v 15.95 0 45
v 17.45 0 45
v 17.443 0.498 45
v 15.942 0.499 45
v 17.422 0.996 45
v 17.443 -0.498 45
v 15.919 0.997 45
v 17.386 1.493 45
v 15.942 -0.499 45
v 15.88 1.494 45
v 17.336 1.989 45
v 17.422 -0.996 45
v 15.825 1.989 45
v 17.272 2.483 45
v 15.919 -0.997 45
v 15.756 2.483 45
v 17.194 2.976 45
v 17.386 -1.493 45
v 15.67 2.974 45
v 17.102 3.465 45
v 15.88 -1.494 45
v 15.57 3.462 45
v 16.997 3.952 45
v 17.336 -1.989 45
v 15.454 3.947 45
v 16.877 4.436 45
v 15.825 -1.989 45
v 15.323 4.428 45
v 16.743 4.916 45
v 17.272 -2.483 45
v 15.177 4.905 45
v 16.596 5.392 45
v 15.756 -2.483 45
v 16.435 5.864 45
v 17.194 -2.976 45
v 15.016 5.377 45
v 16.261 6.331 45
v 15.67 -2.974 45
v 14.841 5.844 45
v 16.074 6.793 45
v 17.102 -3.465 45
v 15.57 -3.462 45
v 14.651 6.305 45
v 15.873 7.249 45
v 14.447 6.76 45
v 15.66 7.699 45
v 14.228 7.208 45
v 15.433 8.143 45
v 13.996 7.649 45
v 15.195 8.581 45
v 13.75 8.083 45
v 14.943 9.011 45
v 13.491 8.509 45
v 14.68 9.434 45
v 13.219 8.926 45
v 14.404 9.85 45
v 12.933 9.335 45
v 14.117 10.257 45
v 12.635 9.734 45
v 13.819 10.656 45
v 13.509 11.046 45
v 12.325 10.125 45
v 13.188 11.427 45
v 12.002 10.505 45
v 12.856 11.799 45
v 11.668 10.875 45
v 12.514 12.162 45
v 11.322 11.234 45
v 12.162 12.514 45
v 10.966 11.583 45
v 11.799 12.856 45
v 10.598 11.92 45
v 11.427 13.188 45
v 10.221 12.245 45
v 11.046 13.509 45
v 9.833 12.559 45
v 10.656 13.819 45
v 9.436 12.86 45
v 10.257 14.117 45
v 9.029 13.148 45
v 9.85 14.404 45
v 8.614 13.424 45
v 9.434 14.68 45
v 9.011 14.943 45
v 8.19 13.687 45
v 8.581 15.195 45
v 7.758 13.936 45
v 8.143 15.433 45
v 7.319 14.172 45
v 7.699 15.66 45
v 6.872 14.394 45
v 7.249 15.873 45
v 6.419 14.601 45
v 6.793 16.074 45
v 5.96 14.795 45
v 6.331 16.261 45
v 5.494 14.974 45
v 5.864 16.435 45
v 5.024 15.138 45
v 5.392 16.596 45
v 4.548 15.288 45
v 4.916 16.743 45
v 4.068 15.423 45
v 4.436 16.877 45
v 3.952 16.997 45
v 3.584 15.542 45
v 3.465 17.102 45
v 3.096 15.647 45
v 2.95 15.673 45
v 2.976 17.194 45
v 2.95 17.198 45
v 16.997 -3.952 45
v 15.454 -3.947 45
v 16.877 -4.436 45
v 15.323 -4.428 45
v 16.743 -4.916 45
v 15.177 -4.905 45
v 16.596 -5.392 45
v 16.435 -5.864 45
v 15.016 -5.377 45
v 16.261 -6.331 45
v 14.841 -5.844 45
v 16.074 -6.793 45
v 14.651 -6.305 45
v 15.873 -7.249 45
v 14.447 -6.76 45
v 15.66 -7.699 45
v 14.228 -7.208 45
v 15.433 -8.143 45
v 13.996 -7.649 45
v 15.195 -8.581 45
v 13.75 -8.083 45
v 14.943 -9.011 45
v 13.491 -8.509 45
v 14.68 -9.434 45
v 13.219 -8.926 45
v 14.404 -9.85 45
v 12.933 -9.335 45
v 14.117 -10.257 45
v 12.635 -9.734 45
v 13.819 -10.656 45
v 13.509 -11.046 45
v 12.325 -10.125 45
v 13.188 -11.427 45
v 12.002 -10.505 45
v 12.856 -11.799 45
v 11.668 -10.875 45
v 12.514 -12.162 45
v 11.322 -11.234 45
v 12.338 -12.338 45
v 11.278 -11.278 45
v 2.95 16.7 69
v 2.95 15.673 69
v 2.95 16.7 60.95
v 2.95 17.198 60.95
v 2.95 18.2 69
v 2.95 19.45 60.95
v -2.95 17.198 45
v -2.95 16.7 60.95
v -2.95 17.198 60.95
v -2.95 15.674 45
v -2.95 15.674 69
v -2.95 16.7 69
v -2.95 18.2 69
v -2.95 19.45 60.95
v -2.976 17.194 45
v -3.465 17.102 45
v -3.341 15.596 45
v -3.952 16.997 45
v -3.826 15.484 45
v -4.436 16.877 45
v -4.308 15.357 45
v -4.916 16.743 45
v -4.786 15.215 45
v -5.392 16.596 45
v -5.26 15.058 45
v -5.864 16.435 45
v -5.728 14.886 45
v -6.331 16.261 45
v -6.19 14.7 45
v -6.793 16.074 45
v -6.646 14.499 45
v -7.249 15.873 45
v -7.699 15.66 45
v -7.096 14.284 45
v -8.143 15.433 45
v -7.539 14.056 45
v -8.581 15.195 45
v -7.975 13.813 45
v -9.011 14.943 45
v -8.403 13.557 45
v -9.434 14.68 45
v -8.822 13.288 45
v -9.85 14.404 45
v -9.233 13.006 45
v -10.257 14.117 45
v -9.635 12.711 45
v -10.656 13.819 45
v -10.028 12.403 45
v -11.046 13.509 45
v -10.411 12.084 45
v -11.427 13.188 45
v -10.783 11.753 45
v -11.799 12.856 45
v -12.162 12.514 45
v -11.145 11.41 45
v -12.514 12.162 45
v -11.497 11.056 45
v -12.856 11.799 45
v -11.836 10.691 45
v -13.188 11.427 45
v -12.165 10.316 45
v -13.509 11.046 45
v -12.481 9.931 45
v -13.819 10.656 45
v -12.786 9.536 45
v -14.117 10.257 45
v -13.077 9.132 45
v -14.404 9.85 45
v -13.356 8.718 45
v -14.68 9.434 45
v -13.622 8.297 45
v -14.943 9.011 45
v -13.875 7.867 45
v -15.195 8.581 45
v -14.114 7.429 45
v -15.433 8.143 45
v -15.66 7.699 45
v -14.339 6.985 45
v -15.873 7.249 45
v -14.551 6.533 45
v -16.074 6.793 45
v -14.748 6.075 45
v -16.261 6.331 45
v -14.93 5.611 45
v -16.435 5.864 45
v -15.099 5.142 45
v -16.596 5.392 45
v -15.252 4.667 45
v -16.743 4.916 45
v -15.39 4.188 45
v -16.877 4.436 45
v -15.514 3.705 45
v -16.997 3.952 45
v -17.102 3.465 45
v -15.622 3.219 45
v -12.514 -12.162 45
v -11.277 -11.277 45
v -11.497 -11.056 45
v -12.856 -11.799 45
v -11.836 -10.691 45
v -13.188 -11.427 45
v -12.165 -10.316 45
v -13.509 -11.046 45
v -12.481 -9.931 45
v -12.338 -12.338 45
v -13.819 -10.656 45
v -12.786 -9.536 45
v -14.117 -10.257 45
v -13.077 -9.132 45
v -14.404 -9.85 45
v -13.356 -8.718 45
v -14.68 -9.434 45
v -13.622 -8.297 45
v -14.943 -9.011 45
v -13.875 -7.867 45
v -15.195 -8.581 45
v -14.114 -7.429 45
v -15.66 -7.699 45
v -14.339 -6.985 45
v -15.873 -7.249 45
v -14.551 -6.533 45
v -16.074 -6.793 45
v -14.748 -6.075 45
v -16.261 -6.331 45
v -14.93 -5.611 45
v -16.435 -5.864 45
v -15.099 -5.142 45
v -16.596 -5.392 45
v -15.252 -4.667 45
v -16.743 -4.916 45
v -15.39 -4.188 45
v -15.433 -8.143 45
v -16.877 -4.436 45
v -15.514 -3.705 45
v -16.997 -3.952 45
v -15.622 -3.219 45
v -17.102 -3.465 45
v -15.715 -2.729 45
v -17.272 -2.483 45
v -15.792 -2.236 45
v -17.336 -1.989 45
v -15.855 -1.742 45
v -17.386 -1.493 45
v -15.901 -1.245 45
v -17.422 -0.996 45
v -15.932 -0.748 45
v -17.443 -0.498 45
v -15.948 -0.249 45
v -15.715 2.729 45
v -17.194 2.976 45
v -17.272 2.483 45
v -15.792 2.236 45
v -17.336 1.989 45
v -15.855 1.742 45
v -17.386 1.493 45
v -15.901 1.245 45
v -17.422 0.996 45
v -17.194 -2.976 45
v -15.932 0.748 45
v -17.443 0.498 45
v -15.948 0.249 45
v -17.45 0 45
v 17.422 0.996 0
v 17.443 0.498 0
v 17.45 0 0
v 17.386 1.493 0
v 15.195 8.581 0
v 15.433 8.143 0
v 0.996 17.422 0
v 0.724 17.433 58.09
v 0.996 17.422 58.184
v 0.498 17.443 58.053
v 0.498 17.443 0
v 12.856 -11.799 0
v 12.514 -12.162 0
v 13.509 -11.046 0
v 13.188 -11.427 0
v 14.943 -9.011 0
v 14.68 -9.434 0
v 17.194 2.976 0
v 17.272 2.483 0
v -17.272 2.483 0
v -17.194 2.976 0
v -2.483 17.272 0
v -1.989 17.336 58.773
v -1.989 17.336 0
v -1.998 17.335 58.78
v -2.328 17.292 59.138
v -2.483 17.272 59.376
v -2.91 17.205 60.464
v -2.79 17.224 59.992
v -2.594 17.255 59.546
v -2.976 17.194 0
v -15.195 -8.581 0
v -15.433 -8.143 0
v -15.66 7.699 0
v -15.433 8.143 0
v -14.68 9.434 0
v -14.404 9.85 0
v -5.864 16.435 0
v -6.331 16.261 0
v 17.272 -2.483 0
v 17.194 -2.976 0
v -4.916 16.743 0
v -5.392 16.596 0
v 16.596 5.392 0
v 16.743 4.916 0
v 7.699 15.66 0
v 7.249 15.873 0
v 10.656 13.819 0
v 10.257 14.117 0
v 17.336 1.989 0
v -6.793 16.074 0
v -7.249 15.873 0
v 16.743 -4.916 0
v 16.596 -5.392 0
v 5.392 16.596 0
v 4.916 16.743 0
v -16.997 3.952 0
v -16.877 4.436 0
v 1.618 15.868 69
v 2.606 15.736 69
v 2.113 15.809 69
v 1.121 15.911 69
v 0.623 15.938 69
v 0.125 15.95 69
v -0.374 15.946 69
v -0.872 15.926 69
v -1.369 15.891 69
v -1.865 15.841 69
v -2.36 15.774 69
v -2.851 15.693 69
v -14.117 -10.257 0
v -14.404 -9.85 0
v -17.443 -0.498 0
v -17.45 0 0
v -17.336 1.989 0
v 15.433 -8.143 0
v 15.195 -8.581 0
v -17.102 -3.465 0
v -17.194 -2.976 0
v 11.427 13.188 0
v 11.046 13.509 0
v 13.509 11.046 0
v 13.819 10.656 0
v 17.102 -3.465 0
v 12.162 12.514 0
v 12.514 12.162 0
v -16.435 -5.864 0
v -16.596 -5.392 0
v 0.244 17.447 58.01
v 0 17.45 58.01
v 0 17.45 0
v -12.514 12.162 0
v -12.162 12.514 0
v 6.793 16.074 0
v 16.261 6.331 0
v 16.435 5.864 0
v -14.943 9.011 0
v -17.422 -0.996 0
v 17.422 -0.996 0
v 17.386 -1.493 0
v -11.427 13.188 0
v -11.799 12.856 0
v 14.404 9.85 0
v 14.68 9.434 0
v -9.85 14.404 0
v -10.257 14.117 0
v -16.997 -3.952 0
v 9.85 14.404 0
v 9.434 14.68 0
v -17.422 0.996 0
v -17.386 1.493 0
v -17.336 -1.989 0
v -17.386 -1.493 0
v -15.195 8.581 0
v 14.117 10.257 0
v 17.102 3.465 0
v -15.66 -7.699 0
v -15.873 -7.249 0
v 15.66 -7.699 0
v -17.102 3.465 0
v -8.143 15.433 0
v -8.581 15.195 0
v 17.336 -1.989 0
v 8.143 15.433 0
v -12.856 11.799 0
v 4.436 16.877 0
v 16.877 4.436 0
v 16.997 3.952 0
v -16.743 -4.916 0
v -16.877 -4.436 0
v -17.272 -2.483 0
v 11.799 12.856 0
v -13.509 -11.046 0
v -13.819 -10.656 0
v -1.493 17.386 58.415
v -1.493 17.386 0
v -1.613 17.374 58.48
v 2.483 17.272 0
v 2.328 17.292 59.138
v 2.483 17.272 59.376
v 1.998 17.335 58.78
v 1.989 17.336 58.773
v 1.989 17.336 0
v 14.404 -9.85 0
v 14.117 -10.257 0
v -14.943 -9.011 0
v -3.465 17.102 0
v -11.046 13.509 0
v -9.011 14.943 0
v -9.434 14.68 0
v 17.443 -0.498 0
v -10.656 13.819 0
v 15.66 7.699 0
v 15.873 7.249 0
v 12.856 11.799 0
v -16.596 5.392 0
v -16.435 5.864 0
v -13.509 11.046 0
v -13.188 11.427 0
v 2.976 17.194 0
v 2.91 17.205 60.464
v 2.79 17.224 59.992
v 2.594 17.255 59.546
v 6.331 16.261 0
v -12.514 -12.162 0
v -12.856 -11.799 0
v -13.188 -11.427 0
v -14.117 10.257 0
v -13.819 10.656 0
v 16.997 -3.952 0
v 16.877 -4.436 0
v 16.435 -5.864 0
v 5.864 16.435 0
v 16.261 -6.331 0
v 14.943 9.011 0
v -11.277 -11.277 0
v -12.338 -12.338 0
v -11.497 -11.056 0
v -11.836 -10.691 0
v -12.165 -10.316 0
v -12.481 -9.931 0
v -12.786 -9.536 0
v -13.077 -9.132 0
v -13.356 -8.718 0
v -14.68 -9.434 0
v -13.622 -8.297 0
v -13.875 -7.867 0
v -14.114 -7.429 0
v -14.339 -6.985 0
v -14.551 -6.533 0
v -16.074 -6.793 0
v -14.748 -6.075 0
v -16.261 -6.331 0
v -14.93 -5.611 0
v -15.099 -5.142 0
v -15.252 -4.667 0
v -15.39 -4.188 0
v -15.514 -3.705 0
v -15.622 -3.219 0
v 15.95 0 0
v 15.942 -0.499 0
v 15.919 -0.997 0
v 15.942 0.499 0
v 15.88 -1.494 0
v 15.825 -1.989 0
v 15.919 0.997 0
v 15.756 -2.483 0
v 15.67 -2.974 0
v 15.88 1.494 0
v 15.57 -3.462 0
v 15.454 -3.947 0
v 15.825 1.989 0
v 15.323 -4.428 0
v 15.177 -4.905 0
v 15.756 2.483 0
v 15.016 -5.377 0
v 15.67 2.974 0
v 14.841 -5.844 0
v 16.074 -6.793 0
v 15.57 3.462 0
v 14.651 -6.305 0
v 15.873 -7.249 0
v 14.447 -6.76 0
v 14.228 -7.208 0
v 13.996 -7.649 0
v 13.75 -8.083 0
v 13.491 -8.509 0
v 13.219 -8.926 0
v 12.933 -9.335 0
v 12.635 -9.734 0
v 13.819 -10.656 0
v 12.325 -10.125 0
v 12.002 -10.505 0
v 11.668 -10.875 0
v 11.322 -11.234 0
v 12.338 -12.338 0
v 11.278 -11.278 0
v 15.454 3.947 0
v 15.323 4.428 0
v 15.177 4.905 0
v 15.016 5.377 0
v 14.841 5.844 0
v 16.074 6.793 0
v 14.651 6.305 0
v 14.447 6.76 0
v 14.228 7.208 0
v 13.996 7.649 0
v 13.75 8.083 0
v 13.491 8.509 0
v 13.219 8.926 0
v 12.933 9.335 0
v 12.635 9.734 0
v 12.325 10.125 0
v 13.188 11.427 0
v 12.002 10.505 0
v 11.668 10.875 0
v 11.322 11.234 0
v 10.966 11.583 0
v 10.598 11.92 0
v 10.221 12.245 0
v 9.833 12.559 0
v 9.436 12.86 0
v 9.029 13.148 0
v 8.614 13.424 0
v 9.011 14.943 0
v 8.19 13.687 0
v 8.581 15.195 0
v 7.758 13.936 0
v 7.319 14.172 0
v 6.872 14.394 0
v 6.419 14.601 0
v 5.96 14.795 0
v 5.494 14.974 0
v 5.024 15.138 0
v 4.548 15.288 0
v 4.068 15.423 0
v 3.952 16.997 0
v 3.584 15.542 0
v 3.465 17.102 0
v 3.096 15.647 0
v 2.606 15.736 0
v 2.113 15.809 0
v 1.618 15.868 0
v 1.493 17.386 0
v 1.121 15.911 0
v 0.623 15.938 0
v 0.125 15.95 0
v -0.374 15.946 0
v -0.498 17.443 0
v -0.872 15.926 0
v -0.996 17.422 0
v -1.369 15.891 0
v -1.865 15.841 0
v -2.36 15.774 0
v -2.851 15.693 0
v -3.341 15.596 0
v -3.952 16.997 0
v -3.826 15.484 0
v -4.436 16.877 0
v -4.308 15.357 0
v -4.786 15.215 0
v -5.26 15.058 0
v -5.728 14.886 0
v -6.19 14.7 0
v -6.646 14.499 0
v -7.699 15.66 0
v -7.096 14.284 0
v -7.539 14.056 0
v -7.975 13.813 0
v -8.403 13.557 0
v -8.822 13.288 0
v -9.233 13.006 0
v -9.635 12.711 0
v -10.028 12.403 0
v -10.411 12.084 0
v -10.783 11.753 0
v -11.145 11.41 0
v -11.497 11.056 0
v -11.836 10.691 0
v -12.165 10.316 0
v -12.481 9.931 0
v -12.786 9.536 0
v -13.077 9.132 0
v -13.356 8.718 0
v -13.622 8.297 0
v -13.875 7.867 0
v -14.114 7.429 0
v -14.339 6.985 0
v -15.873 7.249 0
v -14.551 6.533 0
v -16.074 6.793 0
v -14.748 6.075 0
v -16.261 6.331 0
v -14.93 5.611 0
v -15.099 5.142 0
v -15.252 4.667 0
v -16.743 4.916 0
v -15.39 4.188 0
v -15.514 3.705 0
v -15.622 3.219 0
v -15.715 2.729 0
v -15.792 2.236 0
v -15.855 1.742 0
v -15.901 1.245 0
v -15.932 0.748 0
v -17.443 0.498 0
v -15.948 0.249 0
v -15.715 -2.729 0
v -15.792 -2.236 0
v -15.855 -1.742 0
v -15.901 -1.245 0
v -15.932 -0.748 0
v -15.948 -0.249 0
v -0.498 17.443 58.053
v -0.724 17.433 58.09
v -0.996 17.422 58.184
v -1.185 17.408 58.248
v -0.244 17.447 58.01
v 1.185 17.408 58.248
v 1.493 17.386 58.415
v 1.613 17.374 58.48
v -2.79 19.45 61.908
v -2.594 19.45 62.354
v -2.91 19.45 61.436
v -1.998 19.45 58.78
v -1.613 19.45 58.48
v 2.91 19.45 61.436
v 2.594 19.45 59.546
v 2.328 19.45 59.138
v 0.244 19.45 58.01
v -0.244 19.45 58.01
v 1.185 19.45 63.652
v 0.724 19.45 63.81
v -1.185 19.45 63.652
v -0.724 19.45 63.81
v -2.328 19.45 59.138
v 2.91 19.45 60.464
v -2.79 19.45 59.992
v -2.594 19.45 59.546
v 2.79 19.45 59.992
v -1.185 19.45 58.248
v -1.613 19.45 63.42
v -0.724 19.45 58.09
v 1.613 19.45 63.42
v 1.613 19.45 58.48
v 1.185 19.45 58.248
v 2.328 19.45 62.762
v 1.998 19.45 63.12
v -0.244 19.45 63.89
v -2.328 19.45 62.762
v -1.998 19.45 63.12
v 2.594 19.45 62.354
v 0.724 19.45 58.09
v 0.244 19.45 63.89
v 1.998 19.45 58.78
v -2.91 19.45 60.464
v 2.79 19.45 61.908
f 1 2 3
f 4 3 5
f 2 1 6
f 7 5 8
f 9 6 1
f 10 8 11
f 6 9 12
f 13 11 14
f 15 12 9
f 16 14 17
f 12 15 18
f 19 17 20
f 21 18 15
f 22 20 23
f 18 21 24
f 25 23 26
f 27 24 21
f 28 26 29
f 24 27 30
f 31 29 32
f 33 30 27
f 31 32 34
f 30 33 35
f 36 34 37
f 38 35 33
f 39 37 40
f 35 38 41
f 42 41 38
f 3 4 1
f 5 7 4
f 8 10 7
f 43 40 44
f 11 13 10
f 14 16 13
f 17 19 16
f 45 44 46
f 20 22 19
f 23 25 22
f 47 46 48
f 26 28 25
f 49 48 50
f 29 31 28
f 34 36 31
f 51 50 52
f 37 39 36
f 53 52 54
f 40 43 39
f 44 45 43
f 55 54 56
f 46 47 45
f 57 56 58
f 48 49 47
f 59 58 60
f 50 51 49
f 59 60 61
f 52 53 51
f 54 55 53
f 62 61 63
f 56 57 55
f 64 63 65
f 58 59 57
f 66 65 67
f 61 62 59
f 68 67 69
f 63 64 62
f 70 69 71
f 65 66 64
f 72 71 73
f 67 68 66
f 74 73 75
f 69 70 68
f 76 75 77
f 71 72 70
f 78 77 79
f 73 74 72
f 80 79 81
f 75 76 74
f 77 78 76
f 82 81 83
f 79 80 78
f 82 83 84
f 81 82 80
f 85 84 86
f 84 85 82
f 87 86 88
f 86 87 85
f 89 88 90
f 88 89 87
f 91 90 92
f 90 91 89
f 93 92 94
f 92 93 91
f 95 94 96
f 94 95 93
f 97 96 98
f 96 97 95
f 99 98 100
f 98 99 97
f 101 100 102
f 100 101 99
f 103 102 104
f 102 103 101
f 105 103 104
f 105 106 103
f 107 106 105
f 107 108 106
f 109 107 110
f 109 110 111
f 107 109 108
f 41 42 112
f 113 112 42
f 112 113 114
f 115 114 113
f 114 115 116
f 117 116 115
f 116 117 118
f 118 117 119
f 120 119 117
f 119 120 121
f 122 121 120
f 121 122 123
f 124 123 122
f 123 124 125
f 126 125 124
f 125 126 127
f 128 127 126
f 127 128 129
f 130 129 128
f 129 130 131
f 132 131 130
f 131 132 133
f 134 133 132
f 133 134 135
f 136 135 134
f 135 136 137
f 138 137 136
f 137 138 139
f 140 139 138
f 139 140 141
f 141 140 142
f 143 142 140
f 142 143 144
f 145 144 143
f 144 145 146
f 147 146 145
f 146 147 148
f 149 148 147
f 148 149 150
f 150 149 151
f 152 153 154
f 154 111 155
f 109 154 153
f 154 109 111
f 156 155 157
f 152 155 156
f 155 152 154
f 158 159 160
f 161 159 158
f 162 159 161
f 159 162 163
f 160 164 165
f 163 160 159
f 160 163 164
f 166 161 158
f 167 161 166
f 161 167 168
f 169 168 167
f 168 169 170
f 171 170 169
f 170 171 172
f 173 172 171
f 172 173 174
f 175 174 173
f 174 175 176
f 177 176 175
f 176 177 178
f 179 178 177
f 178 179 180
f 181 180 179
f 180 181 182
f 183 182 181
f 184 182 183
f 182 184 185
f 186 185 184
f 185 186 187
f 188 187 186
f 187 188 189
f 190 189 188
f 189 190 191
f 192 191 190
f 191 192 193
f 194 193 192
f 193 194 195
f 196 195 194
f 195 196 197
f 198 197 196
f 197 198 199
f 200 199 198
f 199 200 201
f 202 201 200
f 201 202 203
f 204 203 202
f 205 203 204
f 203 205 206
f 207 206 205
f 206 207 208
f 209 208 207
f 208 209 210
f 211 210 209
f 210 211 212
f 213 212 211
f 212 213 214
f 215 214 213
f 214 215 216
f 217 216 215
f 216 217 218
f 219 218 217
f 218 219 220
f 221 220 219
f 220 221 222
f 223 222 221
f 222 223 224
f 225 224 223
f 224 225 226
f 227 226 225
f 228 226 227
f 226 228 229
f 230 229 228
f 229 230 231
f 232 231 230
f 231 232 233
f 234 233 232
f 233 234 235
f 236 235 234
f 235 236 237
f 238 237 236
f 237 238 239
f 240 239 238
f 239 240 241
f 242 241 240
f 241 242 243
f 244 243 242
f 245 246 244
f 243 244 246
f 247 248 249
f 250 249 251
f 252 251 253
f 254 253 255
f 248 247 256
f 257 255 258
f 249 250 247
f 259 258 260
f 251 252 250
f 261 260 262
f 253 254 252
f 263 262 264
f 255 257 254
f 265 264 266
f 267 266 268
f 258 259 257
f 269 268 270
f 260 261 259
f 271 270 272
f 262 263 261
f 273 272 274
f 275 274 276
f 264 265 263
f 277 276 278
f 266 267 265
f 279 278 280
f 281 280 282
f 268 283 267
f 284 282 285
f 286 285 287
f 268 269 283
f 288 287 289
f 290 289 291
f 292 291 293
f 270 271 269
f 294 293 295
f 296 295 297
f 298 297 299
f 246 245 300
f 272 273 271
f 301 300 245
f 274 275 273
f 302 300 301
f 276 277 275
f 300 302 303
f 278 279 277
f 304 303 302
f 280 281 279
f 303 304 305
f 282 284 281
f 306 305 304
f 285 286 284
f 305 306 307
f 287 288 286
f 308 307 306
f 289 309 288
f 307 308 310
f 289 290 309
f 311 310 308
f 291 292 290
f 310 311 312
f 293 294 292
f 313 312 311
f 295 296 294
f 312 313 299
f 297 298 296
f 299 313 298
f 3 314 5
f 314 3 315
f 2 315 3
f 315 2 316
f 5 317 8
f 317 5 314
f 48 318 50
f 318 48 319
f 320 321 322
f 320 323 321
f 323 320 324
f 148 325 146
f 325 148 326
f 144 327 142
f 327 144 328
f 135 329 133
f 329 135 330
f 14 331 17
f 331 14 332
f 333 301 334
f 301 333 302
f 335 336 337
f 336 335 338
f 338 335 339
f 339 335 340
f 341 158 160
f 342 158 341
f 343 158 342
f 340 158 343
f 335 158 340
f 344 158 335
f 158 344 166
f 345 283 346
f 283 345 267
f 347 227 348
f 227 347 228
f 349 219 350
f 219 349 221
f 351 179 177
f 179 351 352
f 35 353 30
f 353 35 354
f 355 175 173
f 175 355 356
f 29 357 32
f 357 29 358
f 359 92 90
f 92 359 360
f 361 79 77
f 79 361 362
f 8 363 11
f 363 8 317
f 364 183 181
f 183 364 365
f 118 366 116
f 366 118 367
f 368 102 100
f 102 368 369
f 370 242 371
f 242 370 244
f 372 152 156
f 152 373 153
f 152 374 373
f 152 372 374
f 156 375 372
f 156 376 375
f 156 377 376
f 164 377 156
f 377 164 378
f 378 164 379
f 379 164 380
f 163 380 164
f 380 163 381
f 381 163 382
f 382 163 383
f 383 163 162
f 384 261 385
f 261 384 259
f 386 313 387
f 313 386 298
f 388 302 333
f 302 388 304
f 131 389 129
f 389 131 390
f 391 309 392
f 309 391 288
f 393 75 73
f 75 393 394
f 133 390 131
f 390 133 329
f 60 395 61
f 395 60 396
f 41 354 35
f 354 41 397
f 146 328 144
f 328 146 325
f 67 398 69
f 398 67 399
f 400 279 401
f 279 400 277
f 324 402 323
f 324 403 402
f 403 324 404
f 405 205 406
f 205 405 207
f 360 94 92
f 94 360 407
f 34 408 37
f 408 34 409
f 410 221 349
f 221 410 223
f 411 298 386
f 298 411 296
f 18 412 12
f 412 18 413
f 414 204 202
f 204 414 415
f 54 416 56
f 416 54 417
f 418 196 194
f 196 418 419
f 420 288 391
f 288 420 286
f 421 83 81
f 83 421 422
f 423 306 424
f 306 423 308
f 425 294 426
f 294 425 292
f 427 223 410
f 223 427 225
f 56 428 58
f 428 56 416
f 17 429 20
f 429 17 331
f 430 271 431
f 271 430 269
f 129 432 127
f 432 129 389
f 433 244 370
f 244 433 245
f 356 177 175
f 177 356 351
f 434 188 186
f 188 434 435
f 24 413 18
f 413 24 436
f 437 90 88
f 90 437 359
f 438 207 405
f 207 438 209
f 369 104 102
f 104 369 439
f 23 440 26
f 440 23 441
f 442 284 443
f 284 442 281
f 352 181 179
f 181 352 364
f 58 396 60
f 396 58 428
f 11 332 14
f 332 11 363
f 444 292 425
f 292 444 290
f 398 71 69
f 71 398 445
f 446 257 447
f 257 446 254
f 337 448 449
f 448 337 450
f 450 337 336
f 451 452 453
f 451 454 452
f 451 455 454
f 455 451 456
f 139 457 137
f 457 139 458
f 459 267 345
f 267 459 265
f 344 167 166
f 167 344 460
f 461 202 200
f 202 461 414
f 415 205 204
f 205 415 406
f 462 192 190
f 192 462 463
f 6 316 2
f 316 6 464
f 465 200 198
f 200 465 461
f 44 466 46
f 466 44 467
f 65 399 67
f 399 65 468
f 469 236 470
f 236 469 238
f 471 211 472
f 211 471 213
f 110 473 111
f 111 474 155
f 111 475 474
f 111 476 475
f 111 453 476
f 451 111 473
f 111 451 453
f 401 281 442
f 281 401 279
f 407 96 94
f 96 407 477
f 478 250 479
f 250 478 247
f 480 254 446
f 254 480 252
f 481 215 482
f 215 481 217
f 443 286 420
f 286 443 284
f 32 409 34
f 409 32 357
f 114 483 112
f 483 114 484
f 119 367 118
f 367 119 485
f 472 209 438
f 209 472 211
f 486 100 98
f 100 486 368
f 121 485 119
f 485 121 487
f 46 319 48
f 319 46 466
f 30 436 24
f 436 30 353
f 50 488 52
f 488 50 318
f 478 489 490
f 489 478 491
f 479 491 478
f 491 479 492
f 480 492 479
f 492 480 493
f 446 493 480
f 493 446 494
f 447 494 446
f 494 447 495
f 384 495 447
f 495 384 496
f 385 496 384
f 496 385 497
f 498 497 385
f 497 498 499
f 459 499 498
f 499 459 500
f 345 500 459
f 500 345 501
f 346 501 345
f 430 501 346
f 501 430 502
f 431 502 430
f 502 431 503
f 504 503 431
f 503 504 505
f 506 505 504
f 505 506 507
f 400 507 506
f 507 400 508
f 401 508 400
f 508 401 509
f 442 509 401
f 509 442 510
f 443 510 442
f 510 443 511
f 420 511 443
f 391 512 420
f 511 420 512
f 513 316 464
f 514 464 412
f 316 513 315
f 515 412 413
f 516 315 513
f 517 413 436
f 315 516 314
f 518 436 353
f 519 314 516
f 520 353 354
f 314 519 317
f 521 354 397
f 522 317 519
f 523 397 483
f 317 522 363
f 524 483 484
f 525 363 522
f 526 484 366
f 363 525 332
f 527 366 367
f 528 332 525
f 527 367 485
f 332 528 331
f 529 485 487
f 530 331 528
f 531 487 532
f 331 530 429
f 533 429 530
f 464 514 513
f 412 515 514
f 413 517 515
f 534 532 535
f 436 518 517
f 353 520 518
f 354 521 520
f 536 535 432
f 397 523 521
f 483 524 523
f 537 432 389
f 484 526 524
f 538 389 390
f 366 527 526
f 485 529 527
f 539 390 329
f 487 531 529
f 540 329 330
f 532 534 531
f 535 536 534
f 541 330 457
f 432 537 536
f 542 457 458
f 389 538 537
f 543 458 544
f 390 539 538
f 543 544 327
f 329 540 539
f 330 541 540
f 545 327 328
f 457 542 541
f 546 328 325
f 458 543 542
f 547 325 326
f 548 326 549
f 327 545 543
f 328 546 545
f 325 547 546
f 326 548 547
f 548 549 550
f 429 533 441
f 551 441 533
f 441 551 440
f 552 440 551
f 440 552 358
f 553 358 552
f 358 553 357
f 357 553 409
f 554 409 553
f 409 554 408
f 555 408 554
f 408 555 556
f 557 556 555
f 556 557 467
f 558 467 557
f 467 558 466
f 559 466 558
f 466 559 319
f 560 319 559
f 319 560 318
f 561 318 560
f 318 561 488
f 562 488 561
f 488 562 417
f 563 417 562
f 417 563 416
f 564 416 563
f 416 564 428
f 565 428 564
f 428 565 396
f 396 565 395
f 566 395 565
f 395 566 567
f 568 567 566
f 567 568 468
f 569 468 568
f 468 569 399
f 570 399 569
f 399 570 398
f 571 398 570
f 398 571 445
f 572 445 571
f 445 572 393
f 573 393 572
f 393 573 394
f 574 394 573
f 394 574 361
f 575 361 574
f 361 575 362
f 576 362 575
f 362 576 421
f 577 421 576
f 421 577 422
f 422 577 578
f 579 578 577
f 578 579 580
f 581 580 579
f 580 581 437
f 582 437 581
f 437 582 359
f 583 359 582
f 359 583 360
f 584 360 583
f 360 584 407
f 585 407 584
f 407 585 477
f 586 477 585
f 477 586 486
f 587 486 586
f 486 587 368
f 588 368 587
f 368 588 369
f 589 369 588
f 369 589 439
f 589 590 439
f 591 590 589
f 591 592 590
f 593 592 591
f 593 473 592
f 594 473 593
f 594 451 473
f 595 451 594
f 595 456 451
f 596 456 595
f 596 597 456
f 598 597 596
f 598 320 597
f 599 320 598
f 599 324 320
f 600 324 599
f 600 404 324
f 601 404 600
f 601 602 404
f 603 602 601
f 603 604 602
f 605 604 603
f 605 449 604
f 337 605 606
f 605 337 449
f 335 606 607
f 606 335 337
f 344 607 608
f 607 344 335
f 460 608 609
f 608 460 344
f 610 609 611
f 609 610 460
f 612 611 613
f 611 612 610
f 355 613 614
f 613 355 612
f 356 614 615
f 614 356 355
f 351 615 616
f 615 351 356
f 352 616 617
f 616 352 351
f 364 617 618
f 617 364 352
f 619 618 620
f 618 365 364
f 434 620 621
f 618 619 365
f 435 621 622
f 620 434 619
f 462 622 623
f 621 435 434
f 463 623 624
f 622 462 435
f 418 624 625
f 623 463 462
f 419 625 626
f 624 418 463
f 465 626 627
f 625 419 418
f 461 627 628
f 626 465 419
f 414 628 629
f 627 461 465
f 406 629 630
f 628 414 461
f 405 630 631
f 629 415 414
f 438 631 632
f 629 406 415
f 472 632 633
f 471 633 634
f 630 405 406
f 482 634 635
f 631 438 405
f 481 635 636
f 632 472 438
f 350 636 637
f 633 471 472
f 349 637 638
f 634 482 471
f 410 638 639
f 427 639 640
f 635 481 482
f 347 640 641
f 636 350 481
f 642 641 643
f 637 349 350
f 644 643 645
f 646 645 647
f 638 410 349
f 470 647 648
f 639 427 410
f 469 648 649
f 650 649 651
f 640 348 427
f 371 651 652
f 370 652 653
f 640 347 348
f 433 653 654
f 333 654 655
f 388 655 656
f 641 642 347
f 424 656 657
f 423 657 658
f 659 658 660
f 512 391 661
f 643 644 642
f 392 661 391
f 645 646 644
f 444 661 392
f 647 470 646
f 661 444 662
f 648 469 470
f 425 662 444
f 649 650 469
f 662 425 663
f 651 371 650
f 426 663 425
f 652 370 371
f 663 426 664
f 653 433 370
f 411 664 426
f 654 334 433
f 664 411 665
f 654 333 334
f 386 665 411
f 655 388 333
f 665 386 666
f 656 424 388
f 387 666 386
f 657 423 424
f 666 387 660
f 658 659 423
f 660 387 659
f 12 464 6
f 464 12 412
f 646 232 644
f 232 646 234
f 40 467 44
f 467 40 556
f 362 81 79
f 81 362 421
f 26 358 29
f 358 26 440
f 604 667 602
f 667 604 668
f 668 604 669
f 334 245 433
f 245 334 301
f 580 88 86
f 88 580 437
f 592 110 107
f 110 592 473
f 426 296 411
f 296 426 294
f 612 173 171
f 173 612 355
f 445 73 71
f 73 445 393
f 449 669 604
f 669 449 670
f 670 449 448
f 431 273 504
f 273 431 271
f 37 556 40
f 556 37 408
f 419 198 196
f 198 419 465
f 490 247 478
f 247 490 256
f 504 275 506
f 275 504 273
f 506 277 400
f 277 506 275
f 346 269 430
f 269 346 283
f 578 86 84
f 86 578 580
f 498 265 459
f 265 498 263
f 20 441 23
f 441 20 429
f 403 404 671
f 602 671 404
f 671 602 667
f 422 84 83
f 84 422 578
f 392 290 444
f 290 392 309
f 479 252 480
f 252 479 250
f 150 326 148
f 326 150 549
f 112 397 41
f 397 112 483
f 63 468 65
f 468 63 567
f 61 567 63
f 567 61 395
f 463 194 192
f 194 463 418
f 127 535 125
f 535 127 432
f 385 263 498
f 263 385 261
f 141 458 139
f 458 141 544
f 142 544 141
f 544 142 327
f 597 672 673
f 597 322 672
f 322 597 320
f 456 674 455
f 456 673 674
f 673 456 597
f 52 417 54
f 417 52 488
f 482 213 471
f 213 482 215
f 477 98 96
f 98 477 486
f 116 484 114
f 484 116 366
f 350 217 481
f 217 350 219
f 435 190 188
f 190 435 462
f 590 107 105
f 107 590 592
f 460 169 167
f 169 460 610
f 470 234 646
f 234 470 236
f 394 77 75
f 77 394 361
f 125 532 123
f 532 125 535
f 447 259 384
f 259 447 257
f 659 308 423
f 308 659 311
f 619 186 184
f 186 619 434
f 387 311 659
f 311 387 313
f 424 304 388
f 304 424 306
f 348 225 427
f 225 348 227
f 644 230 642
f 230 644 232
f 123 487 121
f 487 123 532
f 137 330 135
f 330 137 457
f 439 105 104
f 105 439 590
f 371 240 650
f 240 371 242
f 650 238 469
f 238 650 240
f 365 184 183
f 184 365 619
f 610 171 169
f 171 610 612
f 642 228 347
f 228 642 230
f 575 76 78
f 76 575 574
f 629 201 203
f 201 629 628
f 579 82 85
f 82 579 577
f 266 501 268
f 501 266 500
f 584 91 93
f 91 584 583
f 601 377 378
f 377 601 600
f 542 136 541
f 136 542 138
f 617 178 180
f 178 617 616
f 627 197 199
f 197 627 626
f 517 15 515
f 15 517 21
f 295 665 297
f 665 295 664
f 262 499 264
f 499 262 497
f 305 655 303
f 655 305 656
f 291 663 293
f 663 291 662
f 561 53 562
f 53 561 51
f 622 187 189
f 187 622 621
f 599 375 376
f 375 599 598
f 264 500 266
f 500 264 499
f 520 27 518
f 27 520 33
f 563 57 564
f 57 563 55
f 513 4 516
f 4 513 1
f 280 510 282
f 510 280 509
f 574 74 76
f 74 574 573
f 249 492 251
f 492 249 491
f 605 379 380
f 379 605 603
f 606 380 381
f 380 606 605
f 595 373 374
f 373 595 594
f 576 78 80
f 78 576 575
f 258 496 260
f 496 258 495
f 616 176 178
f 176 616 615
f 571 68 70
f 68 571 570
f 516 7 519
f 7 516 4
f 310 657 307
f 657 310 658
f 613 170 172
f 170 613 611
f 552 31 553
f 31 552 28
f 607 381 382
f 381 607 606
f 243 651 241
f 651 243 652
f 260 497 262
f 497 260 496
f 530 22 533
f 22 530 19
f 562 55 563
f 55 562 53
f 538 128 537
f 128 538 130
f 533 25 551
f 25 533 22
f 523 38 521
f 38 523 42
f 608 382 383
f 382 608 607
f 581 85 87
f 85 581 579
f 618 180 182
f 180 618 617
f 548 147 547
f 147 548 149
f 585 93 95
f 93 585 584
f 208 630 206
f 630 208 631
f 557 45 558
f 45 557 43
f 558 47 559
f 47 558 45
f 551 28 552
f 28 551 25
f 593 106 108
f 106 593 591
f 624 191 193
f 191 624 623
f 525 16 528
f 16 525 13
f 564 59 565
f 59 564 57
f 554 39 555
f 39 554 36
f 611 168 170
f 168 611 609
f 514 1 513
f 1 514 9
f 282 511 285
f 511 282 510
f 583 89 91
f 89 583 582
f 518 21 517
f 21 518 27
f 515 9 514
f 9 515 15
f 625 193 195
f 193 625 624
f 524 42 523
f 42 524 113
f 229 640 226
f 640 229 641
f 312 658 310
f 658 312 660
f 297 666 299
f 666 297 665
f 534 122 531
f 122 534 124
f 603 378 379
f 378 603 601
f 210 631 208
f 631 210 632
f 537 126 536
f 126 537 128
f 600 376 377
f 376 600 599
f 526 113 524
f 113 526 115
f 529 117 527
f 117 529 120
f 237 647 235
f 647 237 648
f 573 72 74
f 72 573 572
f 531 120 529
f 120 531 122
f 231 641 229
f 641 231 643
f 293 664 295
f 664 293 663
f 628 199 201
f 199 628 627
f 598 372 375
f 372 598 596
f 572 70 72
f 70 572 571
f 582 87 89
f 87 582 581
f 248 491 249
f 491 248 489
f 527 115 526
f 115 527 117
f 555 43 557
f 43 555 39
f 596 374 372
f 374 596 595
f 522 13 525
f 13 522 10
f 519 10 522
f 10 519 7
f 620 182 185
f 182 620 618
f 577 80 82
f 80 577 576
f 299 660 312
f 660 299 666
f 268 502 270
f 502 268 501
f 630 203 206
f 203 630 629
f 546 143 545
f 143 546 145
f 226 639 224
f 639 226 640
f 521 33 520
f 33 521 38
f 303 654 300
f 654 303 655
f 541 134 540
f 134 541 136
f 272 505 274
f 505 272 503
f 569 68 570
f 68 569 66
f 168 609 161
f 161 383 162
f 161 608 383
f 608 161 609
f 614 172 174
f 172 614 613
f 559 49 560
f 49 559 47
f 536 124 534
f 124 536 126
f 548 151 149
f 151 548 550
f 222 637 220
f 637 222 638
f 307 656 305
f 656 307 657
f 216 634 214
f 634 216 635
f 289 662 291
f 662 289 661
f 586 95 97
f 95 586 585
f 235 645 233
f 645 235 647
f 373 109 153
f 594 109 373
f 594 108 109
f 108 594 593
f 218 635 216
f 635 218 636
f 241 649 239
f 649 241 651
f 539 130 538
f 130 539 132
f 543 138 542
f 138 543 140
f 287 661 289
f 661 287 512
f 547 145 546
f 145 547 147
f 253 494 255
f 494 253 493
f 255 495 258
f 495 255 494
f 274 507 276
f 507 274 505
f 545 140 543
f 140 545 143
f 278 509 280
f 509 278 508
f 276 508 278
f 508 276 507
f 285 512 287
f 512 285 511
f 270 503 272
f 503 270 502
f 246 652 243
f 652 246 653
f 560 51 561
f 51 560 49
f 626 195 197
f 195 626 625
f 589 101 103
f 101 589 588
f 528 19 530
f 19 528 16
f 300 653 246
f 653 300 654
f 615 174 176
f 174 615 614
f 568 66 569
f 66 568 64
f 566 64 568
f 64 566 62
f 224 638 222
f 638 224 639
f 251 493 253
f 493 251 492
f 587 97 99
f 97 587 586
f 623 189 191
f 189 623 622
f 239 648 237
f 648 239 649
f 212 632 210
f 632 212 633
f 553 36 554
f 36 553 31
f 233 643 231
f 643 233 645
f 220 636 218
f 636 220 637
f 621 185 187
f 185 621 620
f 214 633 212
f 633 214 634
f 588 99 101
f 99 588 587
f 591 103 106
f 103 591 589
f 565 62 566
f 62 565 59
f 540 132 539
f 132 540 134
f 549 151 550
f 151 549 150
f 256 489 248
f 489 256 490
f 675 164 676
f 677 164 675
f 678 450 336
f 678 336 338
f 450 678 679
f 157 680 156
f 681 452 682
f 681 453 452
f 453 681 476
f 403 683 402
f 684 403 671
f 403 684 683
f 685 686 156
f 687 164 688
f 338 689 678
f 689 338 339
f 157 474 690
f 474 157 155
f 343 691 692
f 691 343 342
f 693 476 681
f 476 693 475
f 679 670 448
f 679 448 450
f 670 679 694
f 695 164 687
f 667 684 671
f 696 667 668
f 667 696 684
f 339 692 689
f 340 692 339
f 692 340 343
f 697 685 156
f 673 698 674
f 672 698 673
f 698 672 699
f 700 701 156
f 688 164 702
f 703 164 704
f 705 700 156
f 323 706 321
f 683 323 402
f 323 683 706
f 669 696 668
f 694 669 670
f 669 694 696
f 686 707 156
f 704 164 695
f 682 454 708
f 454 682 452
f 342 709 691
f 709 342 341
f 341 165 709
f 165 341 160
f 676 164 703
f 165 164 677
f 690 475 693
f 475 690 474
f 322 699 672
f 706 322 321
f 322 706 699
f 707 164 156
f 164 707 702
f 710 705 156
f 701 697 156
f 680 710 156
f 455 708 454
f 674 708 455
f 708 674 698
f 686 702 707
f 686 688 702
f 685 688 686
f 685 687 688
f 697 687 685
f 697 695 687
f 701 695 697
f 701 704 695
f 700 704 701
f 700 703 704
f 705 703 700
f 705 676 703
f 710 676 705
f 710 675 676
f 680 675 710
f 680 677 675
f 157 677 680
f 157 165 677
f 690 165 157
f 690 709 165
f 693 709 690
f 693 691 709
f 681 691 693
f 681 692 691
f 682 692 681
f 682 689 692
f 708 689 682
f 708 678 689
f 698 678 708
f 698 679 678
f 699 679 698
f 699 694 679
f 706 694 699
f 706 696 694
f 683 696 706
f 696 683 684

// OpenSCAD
height = 45;

slack = 0.1;
inner_diameter = 31.8 + slack;
outer_diameter = 35.0 - slack;
wall = (outer_diameter - inner_diameter) / 2;
tab_width = 6 - slack;
tab_height = 24;
clip_height = 11;
clip_depth = 2;
tab_depth = (outer_diameter - inner_diameter) / 2;

$fa = 0.5;
$fs = 0.5;
$e = 0.001;

difference() {
  cylinder(r=outer_diameter / 2, h=height + tab_height);
  translate([0, 0, -$e])
    cylinder(r=inner_diameter / 2, h=height + tab_height + 2*$e);
  rotate([0, 0, 225], v = [0, 0, 0]) {
    translate([0, 0, -$e])
      cube([outer_diameter, outer_diameter, height + tab_height + 2*$e]);
  }
  for (a = [0, 180]) {
    rotate([0, 0, a], v = [0, 0, 0]) {
      translate([tab_width / 2, -(outer_diameter / 2 + $e), height])
        cube([outer_diameter + 2*$e, outer_diameter + 2*$e, tab_height + $e]);
    }
  }
}

hull() {
  translate([-tab_width / 2, outer_diameter / 2 - wall / 2, height + tab_height - $e])
    cube([tab_width, wall, $e]);

  translate([0, outer_diameter / 2 - wall / 2, height + tab_height - clip_height + tab_width / 2])
    rotate([-90, 0, 0])
      cylinder(r = tab_width / 2, h = clip_depth + wall / 2);
}
